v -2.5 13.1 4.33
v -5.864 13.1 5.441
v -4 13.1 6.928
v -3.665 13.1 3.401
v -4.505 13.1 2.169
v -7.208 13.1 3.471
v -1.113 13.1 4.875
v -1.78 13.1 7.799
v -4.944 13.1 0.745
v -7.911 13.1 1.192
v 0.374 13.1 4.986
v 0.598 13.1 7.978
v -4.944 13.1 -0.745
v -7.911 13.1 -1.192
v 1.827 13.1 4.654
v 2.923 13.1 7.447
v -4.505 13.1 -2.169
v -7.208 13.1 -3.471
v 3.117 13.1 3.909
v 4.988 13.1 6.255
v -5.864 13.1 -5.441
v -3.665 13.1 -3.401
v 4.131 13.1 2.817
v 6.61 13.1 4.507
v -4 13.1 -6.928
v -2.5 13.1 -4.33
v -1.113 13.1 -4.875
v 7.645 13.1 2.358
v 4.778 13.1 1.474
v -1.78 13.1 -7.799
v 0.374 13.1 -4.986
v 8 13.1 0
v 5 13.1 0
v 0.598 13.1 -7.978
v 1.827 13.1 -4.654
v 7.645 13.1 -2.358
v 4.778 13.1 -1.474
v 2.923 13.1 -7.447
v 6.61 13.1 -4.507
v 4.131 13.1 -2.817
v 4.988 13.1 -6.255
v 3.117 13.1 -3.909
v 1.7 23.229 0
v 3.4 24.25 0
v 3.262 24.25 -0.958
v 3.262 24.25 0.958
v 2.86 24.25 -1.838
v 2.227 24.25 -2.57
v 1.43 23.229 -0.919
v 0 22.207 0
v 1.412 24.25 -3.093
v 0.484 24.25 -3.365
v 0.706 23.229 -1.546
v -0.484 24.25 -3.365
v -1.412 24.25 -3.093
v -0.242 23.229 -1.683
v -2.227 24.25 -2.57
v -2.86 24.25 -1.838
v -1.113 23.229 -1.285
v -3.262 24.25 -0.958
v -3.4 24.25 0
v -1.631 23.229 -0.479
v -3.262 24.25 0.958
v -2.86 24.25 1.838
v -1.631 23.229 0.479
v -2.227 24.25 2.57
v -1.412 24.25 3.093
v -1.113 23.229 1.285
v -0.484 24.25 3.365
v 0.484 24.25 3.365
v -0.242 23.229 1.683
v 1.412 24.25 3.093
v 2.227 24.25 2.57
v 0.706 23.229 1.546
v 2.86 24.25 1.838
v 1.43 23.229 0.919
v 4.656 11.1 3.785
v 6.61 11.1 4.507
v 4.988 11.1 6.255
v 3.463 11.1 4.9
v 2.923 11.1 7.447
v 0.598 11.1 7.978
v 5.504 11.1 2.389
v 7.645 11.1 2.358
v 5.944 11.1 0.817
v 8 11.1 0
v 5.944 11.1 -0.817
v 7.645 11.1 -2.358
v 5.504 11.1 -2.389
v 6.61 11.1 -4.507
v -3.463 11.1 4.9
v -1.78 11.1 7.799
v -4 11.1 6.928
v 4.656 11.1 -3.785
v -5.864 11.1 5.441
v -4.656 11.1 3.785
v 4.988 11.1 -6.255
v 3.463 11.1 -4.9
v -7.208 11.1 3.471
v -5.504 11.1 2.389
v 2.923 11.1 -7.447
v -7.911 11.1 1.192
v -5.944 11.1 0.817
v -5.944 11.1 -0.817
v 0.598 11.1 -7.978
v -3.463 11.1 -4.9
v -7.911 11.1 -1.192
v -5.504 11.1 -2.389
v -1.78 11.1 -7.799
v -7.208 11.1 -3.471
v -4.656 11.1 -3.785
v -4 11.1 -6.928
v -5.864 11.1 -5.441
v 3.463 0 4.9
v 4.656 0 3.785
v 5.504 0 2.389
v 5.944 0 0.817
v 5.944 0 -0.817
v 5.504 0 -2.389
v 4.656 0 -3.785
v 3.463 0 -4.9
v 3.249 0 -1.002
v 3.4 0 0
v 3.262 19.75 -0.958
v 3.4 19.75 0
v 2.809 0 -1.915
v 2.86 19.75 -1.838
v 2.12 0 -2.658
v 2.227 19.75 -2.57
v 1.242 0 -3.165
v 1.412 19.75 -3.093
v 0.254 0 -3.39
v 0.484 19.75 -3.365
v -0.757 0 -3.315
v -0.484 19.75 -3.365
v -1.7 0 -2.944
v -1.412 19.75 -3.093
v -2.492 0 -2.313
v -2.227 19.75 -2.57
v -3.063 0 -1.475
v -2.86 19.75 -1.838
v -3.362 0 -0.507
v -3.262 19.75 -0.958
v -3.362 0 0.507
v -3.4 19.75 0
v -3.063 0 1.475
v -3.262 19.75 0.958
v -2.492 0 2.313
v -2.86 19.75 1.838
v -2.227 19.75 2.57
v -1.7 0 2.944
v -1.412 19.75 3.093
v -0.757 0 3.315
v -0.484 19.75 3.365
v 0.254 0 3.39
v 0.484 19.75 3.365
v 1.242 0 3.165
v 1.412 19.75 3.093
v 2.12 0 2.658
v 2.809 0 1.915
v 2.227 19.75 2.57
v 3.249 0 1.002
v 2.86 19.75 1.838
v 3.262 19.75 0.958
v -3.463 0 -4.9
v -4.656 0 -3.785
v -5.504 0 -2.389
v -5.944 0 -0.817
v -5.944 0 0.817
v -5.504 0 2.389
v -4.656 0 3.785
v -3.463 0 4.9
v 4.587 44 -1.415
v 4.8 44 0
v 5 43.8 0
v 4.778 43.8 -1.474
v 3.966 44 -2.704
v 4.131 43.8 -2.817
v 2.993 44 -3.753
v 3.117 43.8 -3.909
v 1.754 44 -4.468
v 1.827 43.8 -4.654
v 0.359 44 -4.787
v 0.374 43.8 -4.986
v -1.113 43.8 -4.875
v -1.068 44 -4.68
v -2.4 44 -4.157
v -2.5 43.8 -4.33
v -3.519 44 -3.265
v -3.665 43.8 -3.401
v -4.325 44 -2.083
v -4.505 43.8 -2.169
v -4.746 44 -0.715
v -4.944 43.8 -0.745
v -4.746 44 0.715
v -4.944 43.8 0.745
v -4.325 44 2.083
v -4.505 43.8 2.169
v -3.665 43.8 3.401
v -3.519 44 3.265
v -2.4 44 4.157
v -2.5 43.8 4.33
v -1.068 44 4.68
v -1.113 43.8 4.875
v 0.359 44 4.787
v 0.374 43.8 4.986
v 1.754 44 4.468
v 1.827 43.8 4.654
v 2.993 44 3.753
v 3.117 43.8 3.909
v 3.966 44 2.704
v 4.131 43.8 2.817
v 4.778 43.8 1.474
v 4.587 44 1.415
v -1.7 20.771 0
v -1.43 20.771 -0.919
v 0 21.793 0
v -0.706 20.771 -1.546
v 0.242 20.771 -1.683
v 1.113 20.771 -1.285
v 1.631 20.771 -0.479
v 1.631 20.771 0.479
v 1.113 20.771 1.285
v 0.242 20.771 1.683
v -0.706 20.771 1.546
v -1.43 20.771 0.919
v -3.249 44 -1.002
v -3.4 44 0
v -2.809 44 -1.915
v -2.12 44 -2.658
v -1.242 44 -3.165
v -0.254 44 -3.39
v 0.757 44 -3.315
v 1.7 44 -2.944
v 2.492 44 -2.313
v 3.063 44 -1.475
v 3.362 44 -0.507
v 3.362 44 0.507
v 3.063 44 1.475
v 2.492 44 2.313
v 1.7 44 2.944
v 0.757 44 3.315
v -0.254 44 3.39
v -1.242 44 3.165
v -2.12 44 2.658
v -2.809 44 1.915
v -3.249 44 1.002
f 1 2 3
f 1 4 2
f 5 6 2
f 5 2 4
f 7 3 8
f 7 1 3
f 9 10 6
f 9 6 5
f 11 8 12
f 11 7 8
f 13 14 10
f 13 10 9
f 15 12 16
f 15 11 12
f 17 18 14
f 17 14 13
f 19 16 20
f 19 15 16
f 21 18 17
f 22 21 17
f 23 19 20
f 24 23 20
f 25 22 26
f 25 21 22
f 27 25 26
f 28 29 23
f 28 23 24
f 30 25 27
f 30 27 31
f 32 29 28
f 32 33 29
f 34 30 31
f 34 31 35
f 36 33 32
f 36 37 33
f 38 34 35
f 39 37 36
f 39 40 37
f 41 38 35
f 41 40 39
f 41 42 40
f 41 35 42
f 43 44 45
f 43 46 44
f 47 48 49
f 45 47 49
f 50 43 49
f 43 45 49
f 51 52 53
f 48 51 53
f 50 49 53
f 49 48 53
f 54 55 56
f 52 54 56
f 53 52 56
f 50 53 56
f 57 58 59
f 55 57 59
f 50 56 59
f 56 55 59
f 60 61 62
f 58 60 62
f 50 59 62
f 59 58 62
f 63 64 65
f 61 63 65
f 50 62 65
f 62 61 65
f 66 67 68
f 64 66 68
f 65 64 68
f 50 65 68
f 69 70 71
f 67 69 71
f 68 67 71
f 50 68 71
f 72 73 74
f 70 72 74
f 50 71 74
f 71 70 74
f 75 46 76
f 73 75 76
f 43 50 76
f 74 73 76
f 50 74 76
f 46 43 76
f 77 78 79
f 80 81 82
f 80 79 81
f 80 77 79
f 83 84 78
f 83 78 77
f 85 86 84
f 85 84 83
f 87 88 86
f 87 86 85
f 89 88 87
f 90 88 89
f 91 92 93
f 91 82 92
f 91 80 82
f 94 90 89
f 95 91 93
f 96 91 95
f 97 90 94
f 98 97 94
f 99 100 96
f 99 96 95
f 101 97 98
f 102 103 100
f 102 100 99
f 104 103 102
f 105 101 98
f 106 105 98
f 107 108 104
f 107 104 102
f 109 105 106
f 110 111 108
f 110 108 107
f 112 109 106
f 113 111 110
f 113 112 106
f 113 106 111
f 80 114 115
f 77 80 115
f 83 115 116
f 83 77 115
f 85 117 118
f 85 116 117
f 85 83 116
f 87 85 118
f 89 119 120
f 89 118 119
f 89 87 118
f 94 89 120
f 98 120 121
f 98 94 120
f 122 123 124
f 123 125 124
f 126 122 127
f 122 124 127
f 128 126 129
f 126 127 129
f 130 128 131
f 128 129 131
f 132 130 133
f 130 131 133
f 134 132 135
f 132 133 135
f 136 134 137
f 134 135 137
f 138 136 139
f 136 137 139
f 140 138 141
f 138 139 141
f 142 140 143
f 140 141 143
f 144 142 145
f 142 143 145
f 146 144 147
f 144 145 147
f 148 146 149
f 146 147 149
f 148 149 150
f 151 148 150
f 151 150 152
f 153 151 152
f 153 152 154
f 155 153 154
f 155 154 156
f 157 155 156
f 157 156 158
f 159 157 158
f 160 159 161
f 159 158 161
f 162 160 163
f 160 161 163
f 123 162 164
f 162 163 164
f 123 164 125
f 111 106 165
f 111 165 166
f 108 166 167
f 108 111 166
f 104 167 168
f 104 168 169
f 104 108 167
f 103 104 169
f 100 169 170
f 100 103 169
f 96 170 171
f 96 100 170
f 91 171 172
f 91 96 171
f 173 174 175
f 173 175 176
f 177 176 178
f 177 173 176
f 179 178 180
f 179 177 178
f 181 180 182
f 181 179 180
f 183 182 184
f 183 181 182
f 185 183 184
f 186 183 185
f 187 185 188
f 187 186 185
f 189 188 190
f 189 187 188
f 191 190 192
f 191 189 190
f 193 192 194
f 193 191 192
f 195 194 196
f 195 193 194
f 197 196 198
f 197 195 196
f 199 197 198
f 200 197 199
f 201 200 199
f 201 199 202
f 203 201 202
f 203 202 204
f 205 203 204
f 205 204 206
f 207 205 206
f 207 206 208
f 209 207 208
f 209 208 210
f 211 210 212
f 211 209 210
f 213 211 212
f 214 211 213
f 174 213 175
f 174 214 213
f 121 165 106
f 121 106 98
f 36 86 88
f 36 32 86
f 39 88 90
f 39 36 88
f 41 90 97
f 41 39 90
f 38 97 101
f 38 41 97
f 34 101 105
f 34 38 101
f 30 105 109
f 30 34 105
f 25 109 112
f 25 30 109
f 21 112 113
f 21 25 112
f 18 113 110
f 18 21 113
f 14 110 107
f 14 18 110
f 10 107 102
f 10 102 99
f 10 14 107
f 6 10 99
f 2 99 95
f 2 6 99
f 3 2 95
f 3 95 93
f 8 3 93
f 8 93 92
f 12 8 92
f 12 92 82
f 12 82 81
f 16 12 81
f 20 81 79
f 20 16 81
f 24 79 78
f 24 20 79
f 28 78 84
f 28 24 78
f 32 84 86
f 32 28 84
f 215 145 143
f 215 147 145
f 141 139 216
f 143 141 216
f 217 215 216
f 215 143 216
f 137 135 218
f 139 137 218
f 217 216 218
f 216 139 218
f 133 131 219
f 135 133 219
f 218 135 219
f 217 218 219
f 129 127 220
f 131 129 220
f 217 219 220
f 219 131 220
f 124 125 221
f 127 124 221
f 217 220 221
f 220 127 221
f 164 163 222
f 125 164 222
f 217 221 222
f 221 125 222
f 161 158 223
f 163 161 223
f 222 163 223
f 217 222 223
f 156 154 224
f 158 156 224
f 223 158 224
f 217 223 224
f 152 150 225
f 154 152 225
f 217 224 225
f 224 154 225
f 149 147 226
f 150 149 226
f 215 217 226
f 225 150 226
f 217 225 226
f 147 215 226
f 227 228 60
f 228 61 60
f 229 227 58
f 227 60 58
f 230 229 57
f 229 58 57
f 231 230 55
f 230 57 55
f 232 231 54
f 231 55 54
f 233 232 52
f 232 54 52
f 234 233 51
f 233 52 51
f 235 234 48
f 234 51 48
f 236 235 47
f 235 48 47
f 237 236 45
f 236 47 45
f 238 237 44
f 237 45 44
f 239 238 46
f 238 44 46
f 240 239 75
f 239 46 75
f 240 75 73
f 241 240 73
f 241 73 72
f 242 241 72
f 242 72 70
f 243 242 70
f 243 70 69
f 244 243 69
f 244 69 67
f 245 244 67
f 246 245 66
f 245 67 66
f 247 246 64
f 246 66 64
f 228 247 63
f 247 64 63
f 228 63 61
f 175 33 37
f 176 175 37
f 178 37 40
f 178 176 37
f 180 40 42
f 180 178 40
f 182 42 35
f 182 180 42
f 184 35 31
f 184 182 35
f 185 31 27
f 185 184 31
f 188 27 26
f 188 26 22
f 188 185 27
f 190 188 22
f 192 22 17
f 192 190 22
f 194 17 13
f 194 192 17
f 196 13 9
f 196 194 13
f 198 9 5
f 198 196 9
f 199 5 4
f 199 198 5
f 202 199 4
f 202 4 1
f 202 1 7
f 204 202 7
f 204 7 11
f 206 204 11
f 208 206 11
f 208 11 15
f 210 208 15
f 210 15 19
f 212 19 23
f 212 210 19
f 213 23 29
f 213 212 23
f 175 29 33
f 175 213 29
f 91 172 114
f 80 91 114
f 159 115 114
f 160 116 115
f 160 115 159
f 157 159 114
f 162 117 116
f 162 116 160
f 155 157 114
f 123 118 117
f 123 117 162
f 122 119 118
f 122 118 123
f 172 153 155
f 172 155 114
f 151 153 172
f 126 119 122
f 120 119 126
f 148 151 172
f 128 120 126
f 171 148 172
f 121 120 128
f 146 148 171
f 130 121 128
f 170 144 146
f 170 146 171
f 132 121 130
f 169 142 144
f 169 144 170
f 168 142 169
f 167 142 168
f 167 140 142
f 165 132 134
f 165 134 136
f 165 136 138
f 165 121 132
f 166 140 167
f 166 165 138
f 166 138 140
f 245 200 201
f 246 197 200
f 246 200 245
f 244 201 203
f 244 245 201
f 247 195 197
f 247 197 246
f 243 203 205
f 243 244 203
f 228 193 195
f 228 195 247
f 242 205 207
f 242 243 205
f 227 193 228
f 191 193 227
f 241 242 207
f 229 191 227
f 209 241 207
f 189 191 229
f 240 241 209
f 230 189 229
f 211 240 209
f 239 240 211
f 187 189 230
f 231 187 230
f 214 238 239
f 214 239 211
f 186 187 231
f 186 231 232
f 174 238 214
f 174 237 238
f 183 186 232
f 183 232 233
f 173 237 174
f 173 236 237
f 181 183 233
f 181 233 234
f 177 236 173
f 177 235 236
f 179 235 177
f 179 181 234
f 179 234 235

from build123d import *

# Parameters (mm, degrees)
SKETCH_2_W             = 6.925315878
SKETCH_2_H             = 1.1
CUT_EXTRUDE_1_DEPTH    = 11.1
HOLE_WIZARD_M8_1_D     = 6.8
HOLE_WIZARD_M8_1_DEPTH = 19.75
HOLE_WIZARD_M8_1_TIP   = 2.042926105
HOLE_WIZARD_M8_2_D     = 6.8
HOLE_WIZARD_M8_2_DEPTH = 19.75
HOLE_WIZARD_M8_2_TIP   = 2.042926105
CHAMFER_1_SIZE         = 0.2


with BuildPart() as part:
    # 草图1 → 旋转1 (revolve)
    with BuildSketch(Plane.XY):
        Polygon((0, 0), (6, 0), (6, 11.1), (8, 11.1), (8, 13.1), (5, 13.1), (5, 44), (0, 44), align=None)
    revolve(axis=Axis((0, -1000, 0), (0, 1, 0)))

    # 草图2 → 切除-拉伸1 (cut)
    with BuildSketch(Plane.XZ):
        with Locations((0, -5.45)):
            Rectangle(SKETCH_2_W, SKETCH_2_H)
        with Locations((0, 5.45)):
            Rectangle(SKETCH_2_W, SKETCH_2_H)
    extrude(amount=-CUT_EXTRUDE_1_DEPTH, mode=Mode.SUBTRACT)

    # M8 螺纹孔1
    with Locations(Plane(origin=(0, 44, 0), x_dir=(1, 0, 0), z_dir=(0, 1, 0))):
        with Locations((0, 0)):
            Hole(HOLE_WIZARD_M8_1_D / 2, depth=HOLE_WIZARD_M8_1_DEPTH)
            with Locations((0, 0, -(HOLE_WIZARD_M8_1_DEPTH + HOLE_WIZARD_M8_1_TIP / 2))):  # 118° drill point
                Cone(0, HOLE_WIZARD_M8_1_D / 2, HOLE_WIZARD_M8_1_TIP, mode=Mode.SUBTRACT)

    # M8 螺纹孔2
    with Locations(Plane(origin=(0, 0, 0), x_dir=(-1, 0, 0), z_dir=(0, -1, 0))):
        with Locations((0, 0)):
            Hole(HOLE_WIZARD_M8_2_D / 2, depth=HOLE_WIZARD_M8_2_DEPTH)
            with Locations((0, 0, -(HOLE_WIZARD_M8_2_DEPTH + HOLE_WIZARD_M8_2_TIP / 2))):  # 118° drill point
                Cone(0, HOLE_WIZARD_M8_2_D / 2, HOLE_WIZARD_M8_2_TIP, mode=Mode.SUBTRACT)

    # 倒角1
    chamfer_1_edges = [part.edges().sort_by_distance(p)[0] for p in [
        (-5, 44, 0),
    ]]
    chamfer(chamfer_1_edges, length=CHAMFER_1_SIZE)


solid = part.part
